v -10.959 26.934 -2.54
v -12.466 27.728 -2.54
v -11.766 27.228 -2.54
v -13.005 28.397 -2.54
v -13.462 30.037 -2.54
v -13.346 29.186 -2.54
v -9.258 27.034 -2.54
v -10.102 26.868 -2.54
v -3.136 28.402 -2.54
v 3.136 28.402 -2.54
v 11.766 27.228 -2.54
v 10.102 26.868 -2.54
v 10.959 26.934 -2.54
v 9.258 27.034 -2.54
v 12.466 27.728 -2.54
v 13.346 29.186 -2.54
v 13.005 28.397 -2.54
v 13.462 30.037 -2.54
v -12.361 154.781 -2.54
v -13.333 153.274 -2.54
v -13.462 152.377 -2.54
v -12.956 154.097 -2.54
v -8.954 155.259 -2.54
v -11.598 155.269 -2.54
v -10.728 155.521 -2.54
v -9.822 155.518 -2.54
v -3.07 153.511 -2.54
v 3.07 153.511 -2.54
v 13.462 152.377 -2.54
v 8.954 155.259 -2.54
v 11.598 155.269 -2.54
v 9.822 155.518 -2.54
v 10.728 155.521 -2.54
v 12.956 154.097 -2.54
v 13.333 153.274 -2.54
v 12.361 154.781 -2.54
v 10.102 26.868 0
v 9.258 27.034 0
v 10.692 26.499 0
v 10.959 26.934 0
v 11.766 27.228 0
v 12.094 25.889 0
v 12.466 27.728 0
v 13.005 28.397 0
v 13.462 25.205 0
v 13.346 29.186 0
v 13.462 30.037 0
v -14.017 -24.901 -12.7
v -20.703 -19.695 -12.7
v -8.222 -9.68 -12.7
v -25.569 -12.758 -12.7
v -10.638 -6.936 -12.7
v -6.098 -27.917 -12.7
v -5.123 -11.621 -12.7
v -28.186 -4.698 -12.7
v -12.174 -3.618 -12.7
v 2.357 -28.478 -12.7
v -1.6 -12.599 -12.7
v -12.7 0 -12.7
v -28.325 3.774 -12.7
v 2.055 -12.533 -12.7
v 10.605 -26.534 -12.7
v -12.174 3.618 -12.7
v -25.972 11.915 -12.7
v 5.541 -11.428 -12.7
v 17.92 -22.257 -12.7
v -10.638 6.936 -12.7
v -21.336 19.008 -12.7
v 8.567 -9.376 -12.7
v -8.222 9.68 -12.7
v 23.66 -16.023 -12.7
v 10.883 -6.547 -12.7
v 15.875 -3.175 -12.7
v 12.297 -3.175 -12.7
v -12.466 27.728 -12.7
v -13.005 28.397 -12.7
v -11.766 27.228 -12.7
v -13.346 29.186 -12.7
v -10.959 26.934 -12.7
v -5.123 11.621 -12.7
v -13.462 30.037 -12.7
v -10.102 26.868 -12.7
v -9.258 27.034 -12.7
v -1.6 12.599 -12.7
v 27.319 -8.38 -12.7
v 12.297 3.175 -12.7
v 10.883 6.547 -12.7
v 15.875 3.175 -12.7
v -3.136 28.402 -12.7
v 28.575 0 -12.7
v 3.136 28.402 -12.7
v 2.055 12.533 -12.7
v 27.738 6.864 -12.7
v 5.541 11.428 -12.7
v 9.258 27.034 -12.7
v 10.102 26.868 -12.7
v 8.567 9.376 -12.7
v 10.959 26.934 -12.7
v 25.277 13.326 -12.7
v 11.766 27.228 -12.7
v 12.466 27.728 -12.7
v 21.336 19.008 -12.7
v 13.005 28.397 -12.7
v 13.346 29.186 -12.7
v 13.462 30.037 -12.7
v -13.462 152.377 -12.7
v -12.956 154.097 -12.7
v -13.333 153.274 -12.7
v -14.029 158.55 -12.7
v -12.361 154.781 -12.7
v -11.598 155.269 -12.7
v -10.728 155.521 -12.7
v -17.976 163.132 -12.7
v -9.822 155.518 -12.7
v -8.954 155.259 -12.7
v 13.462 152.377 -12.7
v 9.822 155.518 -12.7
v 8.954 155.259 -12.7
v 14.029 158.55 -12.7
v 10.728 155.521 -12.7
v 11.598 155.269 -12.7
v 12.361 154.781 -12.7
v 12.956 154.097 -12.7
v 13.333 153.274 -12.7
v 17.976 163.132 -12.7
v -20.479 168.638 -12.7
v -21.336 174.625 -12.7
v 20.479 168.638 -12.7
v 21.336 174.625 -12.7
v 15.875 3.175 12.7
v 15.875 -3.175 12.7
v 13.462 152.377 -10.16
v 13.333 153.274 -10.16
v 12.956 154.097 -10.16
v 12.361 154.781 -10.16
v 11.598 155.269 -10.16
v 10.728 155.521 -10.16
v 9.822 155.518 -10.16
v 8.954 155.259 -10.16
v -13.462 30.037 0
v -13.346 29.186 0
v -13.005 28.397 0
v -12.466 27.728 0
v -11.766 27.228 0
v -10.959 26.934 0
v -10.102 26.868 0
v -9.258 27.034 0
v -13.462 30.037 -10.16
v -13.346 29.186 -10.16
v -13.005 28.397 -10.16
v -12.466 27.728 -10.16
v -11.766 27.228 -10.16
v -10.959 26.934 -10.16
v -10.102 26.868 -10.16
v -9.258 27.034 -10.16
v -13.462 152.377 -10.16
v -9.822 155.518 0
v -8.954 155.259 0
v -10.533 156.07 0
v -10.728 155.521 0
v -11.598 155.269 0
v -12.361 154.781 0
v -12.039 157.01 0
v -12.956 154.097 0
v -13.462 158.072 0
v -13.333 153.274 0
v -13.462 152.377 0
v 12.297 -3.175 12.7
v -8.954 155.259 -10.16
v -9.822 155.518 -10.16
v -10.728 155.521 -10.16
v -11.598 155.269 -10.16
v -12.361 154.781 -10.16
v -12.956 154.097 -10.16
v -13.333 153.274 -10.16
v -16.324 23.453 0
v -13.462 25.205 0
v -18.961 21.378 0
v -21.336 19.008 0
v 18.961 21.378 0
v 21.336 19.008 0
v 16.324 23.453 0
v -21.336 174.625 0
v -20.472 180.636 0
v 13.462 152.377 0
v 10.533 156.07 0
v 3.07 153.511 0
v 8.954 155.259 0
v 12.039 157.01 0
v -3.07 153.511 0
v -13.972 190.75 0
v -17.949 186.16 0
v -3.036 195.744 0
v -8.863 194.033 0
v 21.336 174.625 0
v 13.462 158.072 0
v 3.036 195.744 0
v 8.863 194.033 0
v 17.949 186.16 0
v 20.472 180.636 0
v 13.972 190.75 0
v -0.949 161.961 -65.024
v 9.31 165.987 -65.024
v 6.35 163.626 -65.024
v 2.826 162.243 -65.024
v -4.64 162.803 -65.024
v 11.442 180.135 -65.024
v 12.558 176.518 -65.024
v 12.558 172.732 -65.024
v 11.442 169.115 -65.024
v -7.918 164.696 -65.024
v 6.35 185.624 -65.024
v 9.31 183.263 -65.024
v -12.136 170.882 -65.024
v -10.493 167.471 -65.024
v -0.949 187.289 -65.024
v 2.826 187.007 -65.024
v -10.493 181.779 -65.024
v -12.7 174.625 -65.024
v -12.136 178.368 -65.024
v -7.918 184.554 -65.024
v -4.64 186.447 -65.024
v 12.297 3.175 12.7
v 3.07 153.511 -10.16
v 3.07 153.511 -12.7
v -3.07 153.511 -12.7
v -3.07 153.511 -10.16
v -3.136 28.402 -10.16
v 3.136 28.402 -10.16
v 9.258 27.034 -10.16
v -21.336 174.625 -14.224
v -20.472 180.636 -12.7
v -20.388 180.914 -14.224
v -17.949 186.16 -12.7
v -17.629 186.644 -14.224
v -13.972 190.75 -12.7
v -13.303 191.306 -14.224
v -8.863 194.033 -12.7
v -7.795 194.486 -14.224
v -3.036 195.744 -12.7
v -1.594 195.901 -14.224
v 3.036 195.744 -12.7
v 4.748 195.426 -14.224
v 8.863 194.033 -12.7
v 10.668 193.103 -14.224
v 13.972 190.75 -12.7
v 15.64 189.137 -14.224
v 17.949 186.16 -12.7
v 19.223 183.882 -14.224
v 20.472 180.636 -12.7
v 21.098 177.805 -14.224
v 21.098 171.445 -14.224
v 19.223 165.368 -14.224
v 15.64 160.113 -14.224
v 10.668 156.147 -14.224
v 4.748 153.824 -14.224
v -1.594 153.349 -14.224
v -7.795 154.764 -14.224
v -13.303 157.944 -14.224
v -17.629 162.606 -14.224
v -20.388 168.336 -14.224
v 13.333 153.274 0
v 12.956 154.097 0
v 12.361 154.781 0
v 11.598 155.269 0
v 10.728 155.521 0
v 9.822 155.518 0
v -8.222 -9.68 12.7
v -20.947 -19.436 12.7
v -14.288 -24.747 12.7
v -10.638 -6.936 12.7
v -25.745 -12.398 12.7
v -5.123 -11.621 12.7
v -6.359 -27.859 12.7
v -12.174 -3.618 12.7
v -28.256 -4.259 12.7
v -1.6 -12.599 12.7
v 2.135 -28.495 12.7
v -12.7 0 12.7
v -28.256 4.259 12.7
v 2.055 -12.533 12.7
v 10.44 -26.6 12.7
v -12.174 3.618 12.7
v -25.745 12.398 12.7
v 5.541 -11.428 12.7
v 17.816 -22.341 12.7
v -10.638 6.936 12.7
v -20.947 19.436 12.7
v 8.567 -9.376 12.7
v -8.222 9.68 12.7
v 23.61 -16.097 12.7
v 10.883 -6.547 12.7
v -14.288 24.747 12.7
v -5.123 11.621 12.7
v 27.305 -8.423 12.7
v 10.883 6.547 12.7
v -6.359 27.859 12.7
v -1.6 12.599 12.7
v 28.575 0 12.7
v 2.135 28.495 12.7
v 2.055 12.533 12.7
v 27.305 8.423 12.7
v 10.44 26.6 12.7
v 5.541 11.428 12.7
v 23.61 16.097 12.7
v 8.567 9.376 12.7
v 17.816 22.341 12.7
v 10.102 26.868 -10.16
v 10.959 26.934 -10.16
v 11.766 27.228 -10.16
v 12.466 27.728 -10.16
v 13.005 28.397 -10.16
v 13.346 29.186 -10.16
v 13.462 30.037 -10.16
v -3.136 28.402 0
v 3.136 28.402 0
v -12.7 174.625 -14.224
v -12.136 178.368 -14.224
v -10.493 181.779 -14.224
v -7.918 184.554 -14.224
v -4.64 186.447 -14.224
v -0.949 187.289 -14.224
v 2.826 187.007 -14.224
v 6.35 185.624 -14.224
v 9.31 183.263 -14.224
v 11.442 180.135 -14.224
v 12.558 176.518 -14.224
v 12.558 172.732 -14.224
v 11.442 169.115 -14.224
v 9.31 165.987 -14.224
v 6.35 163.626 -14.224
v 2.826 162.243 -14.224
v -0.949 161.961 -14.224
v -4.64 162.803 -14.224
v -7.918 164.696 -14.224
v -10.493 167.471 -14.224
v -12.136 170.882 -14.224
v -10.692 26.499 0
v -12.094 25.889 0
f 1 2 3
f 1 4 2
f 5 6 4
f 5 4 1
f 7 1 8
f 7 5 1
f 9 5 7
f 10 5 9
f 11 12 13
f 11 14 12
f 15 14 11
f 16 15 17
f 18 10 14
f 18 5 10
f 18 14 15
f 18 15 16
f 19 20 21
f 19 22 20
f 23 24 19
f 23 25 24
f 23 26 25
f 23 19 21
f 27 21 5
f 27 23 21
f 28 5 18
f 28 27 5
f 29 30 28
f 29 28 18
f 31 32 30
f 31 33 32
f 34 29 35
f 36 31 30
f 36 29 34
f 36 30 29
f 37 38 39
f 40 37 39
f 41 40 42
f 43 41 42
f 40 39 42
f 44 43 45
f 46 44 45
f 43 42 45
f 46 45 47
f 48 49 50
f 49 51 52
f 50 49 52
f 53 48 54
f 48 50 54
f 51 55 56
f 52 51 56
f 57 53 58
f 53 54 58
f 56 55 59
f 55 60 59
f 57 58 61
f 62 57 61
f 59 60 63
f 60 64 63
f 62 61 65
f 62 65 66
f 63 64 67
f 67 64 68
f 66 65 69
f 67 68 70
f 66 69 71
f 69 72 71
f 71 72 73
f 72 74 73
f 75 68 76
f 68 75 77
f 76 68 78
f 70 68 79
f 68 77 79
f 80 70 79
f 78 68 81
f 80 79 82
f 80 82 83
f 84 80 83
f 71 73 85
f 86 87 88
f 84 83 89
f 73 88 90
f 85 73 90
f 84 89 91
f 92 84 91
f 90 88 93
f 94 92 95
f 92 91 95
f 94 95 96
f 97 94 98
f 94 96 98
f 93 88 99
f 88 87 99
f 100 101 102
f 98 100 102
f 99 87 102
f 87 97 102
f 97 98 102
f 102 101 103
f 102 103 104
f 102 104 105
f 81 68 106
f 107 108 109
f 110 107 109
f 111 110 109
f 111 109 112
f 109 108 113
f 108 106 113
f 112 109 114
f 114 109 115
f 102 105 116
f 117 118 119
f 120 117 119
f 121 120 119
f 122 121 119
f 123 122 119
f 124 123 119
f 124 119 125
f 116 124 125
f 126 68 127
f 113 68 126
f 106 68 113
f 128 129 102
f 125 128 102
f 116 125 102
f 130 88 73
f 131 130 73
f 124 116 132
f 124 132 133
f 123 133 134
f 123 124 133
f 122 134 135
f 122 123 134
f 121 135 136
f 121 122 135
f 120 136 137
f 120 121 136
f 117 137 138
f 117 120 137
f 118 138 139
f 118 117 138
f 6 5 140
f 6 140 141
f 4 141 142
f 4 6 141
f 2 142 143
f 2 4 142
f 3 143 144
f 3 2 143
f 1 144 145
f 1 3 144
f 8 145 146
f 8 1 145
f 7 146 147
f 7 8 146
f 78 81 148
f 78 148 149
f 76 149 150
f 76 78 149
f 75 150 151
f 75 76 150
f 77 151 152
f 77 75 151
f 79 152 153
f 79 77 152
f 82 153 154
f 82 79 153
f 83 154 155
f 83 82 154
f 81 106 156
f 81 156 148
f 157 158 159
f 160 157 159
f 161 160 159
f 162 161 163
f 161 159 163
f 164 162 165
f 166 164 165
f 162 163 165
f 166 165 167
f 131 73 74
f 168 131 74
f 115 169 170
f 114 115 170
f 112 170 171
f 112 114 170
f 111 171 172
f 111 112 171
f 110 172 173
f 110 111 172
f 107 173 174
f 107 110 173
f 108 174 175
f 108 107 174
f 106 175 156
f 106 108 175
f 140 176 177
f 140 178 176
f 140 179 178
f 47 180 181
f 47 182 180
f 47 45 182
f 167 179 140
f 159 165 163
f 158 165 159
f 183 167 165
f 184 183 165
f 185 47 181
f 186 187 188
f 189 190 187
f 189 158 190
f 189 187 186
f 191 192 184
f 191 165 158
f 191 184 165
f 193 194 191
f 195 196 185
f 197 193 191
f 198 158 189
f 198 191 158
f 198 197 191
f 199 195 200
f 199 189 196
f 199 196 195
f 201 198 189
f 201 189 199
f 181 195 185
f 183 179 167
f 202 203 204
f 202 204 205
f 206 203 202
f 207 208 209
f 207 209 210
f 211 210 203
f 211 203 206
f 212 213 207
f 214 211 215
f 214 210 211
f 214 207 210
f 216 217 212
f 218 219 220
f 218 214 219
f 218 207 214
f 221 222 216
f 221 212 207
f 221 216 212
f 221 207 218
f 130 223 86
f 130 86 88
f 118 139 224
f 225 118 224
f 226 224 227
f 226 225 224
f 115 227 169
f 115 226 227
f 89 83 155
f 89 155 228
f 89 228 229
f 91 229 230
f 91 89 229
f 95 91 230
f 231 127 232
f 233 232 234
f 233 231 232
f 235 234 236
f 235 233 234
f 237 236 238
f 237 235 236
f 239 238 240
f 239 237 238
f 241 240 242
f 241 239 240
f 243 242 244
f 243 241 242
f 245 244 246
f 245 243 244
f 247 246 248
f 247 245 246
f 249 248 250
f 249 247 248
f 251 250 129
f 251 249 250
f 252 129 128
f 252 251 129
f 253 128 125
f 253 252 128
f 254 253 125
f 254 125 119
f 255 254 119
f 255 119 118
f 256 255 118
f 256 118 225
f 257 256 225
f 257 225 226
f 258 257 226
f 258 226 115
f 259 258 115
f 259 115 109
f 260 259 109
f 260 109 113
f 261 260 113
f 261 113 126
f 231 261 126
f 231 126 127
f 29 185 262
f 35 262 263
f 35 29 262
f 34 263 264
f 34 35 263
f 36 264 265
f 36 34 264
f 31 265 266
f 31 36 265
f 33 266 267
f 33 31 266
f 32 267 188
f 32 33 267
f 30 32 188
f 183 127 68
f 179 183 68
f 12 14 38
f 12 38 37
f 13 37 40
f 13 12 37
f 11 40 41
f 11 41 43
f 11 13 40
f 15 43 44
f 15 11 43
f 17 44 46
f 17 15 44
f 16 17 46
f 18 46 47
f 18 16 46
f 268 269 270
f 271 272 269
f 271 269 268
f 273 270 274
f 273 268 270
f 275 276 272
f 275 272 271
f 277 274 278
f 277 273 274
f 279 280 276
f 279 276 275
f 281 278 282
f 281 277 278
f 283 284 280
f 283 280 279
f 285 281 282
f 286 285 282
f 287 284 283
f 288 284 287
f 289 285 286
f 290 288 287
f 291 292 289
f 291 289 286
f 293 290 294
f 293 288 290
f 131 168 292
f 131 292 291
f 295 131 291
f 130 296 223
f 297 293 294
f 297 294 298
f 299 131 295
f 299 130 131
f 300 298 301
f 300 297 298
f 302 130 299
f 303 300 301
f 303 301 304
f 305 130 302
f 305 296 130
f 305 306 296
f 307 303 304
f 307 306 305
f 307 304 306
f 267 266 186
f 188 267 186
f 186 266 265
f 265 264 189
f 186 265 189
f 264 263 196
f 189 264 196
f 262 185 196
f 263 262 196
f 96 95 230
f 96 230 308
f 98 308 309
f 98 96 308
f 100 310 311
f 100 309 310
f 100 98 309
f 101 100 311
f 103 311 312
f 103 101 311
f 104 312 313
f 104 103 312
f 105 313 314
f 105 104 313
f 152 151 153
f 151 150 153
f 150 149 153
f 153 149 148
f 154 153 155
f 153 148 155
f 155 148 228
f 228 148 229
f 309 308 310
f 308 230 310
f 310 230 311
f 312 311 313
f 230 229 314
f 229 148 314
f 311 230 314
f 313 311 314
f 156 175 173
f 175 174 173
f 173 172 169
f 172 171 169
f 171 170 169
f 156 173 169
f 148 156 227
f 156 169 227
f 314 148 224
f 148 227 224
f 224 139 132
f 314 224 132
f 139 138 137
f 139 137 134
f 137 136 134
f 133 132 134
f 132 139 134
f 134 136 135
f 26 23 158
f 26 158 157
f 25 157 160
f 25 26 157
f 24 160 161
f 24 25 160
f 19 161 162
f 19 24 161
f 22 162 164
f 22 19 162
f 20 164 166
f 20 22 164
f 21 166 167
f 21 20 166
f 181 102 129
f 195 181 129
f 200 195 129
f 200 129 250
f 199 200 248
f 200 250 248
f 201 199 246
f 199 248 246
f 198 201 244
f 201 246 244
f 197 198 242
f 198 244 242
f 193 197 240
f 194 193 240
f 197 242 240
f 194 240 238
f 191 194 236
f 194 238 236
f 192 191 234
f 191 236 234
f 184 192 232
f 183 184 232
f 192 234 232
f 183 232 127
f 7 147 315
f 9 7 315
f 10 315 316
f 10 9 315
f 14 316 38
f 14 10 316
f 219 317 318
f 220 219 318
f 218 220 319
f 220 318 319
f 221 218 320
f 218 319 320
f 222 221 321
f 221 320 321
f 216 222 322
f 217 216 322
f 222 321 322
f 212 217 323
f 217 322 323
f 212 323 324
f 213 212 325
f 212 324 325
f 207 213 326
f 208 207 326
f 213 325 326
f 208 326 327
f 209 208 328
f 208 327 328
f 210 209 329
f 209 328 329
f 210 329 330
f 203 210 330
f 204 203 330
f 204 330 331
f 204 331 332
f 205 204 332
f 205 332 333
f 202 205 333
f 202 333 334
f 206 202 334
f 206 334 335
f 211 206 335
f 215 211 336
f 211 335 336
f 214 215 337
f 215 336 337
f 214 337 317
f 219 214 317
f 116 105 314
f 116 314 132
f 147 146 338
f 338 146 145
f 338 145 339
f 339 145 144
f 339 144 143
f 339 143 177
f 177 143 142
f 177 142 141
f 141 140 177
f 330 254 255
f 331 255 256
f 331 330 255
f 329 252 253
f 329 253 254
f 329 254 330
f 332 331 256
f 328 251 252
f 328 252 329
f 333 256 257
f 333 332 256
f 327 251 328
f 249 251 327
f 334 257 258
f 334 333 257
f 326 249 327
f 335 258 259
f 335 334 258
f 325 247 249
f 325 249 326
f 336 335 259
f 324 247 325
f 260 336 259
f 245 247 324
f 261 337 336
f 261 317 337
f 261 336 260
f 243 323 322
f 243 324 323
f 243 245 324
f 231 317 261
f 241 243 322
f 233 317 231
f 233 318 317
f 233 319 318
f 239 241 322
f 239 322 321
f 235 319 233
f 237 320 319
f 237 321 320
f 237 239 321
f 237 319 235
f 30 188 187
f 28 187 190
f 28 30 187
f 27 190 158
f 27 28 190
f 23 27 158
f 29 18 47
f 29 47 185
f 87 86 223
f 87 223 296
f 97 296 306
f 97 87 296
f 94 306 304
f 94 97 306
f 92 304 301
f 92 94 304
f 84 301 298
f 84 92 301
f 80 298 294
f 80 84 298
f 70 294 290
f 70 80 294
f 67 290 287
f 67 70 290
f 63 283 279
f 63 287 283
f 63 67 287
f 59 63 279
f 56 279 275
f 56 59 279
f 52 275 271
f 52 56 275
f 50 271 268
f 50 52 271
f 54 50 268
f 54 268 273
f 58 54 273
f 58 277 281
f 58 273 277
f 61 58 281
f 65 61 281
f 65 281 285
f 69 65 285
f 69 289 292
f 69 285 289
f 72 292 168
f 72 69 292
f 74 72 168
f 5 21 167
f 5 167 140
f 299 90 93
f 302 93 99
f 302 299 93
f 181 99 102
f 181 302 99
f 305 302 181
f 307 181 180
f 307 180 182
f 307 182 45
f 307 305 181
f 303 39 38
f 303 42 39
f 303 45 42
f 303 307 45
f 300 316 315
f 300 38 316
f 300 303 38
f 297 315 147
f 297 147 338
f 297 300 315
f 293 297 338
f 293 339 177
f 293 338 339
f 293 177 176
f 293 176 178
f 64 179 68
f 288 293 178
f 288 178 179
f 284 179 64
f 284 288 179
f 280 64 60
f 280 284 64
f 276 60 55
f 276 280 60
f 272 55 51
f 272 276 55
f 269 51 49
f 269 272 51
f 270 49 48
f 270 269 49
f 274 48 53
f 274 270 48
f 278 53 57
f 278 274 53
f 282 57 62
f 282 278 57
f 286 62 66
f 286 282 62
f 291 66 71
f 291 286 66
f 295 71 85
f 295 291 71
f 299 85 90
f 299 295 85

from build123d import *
from build123d.topology import SkipClean

# Parameters (mm, degrees)
SKETCH1_R            = 28.574999999999996
BASE_PIVOT_DEPTH     = 12.7
SHAFT_START          = -12.7
SHAFT_DEPTH          = 12.7
TOP_START            = 1.524
SKETCH3_R            = 21.335999999999974
TOP_SHELF_DEPTH      = 1.524
SKETCH4_R            = 12.699999999999998
TOP_PIN_DEPTH        = 50.8
FRONT_START          = -2.54
FRONT_RECESS_DEPTH   = 2.54
BACK_RECESS_DEPTH    = 2.54
BASE_HOLE_DEPTH      = 209.43551693989195
BASE_HOLE_DEPTH_BACK = 209.43551693989195
SKETCH7_R            = 12.7
KEY_WAY_DEPTH        = 209.43551693989195
KEY_WAY_DEPTH_BACK   = 209.43551693989195
FILLET1_R            = 3.175


with BuildPart() as part:
    # Sketch1 → Base pivot (new, symmetric)
    with BuildSketch(Plane.XY):
        Circle(SKETCH1_R)
    extrude(amount=BASE_PIVOT_DEPTH, both=True)

    # Sketch2 → Shaft (add)
    with BuildSketch(Plane.XY.offset(SHAFT_START)):
        with BuildLine():
            Line((-21.335999999999938, 174.625), (-21.336000000000002, 7.84e-15))
            Line((-21.336000000000002, 7.84e-15), (21.336000000000002, 0))
            Line((21.336000000000002, 0), (21.336000000000002, 174.625))
            ThreePointArc((21.336000000000002, 174.625), (3.338e-14, 195.96099999999996), (-21.335999999999938, 174.625))
        make_face()
    extrude(amount=SHAFT_DEPTH)

    # Sketch3 → Top shelf (add)
    with SkipClean():  # the faces are left unmerged after this step: merging them gives an invalid solid
        with BuildSketch(Plane(origin=(0, 0, -12.7), x_dir=(-1, 0, 0), z_dir=(0, 0, -1)).offset(TOP_START)):
            with Locations((-3.208e-14, 174.625)):
                Circle(SKETCH3_R)
        extrude(amount=-TOP_SHELF_DEPTH)

    # Sketch4 → Top pin (add)
    with SkipClean():  # the faces are left unmerged after this step: merging them gives an invalid solid
        with BuildSketch(Plane(origin=(0, 0, -14.223999999999998), x_dir=(-1, 0, 0), z_dir=(0, 0, -1))):
            with Locations((-3.208e-14, 174.625)):
                Circle(SKETCH4_R)
        extrude(amount=TOP_PIN_DEPTH)

    # Sketch5 → Front recess (cut)
    with SkipClean():  # the faces are left unmerged after this step: merging them gives an invalid solid
        with BuildSketch(Plane.XY.offset(FRONT_START)):
            with BuildLine():
                Line((-13.461999999999927, 158.07207119570683), (-13.461999999999975, 25.20526097861318))
                ThreePointArc((-13.461999999999975, 25.20526097861318), (1.75e-15, 28.574999999999992), (13.461999999999987, 25.205260978613172))
                Line((13.461999999999987, 25.205260978613172), (13.462000000000003, 158.07207119570683))
                ThreePointArc((13.462000000000003, 158.07207119570683), (3.812e-14, 153.28900000000004), (-13.461999999999927, 158.07207119570683))
            make_face()
        extrude(amount=FRONT_RECESS_DEPTH, mode=Mode.SUBTRACT)

    # Sketch6 → Back recess (cut)
    with SkipClean():  # the faces are left unmerged after this step: merging them gives an invalid solid
        with BuildSketch(Plane(origin=(0, 0, -12.7), x_dir=(-1, 0, 0), z_dir=(0, 0, -1))):
            with BuildLine():
                Line((13.461999999999929, 158.07207119570683), (13.461999999999975, 25.20526097861318))
                ThreePointArc((13.461999999999975, 25.20526097861318), (-1.094e-14, 28.574999999999992), (-13.461999999999987, 25.205260978613172))
                Line((-13.461999999999987, 25.205260978613172), (-13.461999999999998, 158.07207119570683))
                ThreePointArc((-13.461999999999998, 158.07207119570683), (-3.551e-14, 153.28900000000004), (13.461999999999929, 158.07207119570683))
            make_face()
        extrude(amount=-BACK_RECESS_DEPTH, mode=Mode.SUBTRACT)

    # Sketch7 → Base hole (cut, two sides: drawn at the far end of the back side and taken through both)
    with SkipClean():  # the faces are left unmerged after this step: merging them gives an invalid solid
        with BuildSketch(Plane.XY.offset(-BASE_HOLE_DEPTH_BACK)):
            Circle(SKETCH7_R)
        extrude(amount=BASE_HOLE_DEPTH + BASE_HOLE_DEPTH_BACK, mode=Mode.SUBTRACT)

    # Sketch8 → Key way (cut, two sides: drawn at the far end of the back side and taken through both)
    with SkipClean():  # the faces are left unmerged after this step: merging them gives an invalid solid
        with BuildSketch(Plane.XY.offset(-KEY_WAY_DEPTH_BACK)):
            Polygon((4e-16, 3.1750000000000003), (15.875, 3.174999999999997), (15.875, -3.1750000000000034), (-7.7e-16, -3.1750000000000003), align=None)
        extrude(amount=KEY_WAY_DEPTH + KEY_WAY_DEPTH_BACK, mode=Mode.SUBTRACT)

    # Fillet1
    # the kernel refuses this fillet: 3.175 mm, written as the material it adds along each edge
    with BuildSketch(Plane(origin=(-13.461999999999927, 158.07207119570683, -16.77729862803093), x_dir=(0.8483467712248999, -0.5294409842015325, 0), z_dir=(0, 0, 1))) as fillet1_piece_1_section:
        with BuildLine():
            CenterArc((5.70862475783739, -3.1502914039819587), FILLET1_R, 97.15273031823853, 114.81496184230716)
            Line((3.0151237591983637, -4.831266528821872), (0, 0))
            ThreePointArc((0, 0), (2.656645316666723, -0.16604176524117806), (5.313290633333425, -6e-17))
        make_face()
    fillet1_piece_1 = extrude(amount=16.77729862803093, mode=Mode.PRIVATE)
    fillet1_piece_1 = split(fillet1_piece_1, bisect_by=Plane(origin=(-12.378027921631585, 155.86897654595924, -12.7), z_dir=(0, 0, 1)), keep=Keep.TOP, mode=Mode.PRIVATE)
    add(fillet1_piece_1)
    with BuildSketch(Plane(origin=(13.462000000000003, 158.07207119570683, -16.777298628030998), x_dir=(0, -1, 0), z_dir=(0, 0, 1))) as fillet1_piece_2_section:
        with BuildLine():
            CenterArc((5.6949194512123995, -3.1750000000000007), FILLET1_R, 90, 114.81496184230605)
            ThreePointArc((2.813073822260918, -4.50751295336787), (1.5473979065612582, -2.1658471610760905), (0, 0))
            Line((0, 0), (5.6949194512123995, 0))
        make_face()
    fillet1_piece_2 = extrude(amount=16.777298628030998, mode=Mode.PRIVATE)
    fillet1_piece_2 = split(fillet1_piece_2, bisect_by=Plane(origin=(12.378027921631652, 155.86897654595924, -12.7), z_dir=(0, 0, 1)), keep=Keep.TOP, mode=Mode.PRIVATE)
    add(fillet1_piece_2)
    with BuildSketch(Plane(origin=(13.461999999999982, 25.205260978613172, -14.620128336437258), x_dir=(-0.9170202383773097, 0.39884067295904263, 0), z_dir=(0, 0, 1))) as fillet1_piece_3_section:
        with BuildLine():
            CenterArc((4.838757862902442, -3.1647697300383113), FILLET1_R, 94.60072202830712, 108.90500130287109)
            Line((1.9272186060544878, -4.431088866683278), (0, 0))
            ThreePointArc((0, 0), (2.2920431982169482, -0.0920724296552107), (4.584086396433892, 1.4e-16))
        make_face()
    fillet1_piece_3 = extrude(amount=14.620128336437258, mode=Mode.PRIVATE)
    fillet1_piece_3 = split(fillet1_piece_3, bisect_by=Plane(origin=(12.464896317702909, 26.864585865403097, -12.7), z_dir=(0, 0, 1)), keep=Keep.TOP, mode=Mode.PRIVATE)
    add(fillet1_piece_3)
    with BuildSketch(Plane(origin=(-13.461999999999975, 25.20526097861318, -14.620128336437222), x_dir=(0.9170202383773097, 0.3988406729590427, 0), z_dir=(0, 0, 1))) as fillet1_piece_4_section:
        with BuildLine():
            CenterArc((4.838757862902452, 3.164769730038311), FILLET1_R, 156.49427666882212, 108.90500130287074)
            Line((1.927218606054489, 4.431088866683262), (0, 0))
            ThreePointArc((0, 0), (2.292043198216952, 0.09207242965520915), (4.5840863964339, 1e-17))
        make_face()
    fillet1_piece_4 = extrude(amount=14.620128336437222, mode=Mode.PRIVATE)
    fillet1_piece_4 = split(fillet1_piece_4, bisect_by=Plane(origin=(-12.464896317702895, 26.864585865403104, -12.7), z_dir=(0, 0, 1)), keep=Keep.TOP, mode=Mode.PRIVATE)
    add(fillet1_piece_4)
    with BuildSketch(Plane(origin=(13.462, 158.07207119570683, -12.7), x_dir=(0, -1, 0), z_dir=(0, 0, 1))) as fillet1_piece_5_section:
        with BuildLine():
            CenterArc((5.6949194512123995, -3.1750000000000007), FILLET1_R, 90, 114.81496184230605)
            ThreePointArc((2.813073822260918, -4.50751295336787), (1.5473979065612582, -2.1658471610760905), (0, 0))
            Line((0, 0), (5.6949194512123995, 0))
        make_face()
    fillet1_piece_5 = extrude(amount=16.777298628031005, mode=Mode.PRIVATE)
    fillet1_piece_5 = split(fillet1_piece_5, bisect_by=Plane(origin=(12.378027921631652, 155.86897654595924, 0), z_dir=(0, 0, -1)), keep=Keep.TOP, mode=Mode.PRIVATE)
    add(fillet1_piece_5)
    with BuildSketch(Plane(origin=(-13.46199999999993, 158.07207119570683, -12.7), x_dir=(-3.1e-16, -1, 0), z_dir=(0, 0, 1))) as fillet1_piece_6_section:
        with BuildLine():
            CenterArc((5.6949194512124555, 3.1750000000000007), FILLET1_R, 155.18503815769455, 114.81496184230548)
            ThreePointArc((2.8130738222609453, 4.507512953367848), (1.5473979065612575, 2.1658471610760963), (0, 0))
            Line((0, 0), (5.694919451212456, 0))
        make_face()
    fillet1_piece_6 = extrude(amount=16.777298628031147, mode=Mode.PRIVATE)
    fillet1_piece_6 = split(fillet1_piece_6, bisect_by=Plane(origin=(-12.378027921631558, 155.86897654595919, 0), z_dir=(0, 0, -1)), keep=Keep.TOP, mode=Mode.PRIVATE)
    add(fillet1_piece_6)
    with BuildSketch(Plane(origin=(-13.461999999999975, 25.20526097861318, -12.7), x_dir=(0, 1, 0), z_dir=(0, 0, 1))) as fillet1_piece_7_section:
        with BuildLine():
            CenterArc((4.832051334574889, -3.1750000000000007), FILLET1_R, 90, 108.905001302871)
            ThreePointArc((1.8283201032560825, -4.203700000000001), (0.9985923330184399, -2.0651277701953425), (0, 0))
            Line((0, 0), (4.832051334574889, 0))
        make_face()
    fillet1_piece_7 = extrude(amount=14.620128336437226, mode=Mode.PRIVATE)
    fillet1_piece_7 = split(fillet1_piece_7, bisect_by=Plane(origin=(-12.4648963177029, 26.8645858654031, 0), z_dir=(0, 0, -1)), keep=Keep.TOP, mode=Mode.PRIVATE)
    add(fillet1_piece_7)
    with BuildSketch(Plane(origin=(13.46199999999999, 25.205260978613172, -12.7), x_dir=(-0.9170202383773102, 0.3988406729590419, 0), z_dir=(0, 0, 1))) as fillet1_piece_8_section:
        with BuildLine():
            CenterArc((4.838757862902448, -3.164769730038312), FILLET1_R, 94.60072202830708, 108.905001302871)
            Line((1.927218606054491, -4.4310888666832735), (0, 0))
            ThreePointArc((0, 0), (2.2920431982169456, -0.09207242965520608), (4.584086396433901, -1e-17))
        make_face()
    fillet1_piece_8 = extrude(amount=14.620128336437253, mode=Mode.PRIVATE)
    fillet1_piece_8 = split(fillet1_piece_8, bisect_by=Plane(origin=(12.464896317702909, 26.8645858654031, 0), z_dir=(0, 0, -1)), keep=Keep.TOP, mode=Mode.PRIVATE)
    add(fillet1_piece_8)


solid = part.part
